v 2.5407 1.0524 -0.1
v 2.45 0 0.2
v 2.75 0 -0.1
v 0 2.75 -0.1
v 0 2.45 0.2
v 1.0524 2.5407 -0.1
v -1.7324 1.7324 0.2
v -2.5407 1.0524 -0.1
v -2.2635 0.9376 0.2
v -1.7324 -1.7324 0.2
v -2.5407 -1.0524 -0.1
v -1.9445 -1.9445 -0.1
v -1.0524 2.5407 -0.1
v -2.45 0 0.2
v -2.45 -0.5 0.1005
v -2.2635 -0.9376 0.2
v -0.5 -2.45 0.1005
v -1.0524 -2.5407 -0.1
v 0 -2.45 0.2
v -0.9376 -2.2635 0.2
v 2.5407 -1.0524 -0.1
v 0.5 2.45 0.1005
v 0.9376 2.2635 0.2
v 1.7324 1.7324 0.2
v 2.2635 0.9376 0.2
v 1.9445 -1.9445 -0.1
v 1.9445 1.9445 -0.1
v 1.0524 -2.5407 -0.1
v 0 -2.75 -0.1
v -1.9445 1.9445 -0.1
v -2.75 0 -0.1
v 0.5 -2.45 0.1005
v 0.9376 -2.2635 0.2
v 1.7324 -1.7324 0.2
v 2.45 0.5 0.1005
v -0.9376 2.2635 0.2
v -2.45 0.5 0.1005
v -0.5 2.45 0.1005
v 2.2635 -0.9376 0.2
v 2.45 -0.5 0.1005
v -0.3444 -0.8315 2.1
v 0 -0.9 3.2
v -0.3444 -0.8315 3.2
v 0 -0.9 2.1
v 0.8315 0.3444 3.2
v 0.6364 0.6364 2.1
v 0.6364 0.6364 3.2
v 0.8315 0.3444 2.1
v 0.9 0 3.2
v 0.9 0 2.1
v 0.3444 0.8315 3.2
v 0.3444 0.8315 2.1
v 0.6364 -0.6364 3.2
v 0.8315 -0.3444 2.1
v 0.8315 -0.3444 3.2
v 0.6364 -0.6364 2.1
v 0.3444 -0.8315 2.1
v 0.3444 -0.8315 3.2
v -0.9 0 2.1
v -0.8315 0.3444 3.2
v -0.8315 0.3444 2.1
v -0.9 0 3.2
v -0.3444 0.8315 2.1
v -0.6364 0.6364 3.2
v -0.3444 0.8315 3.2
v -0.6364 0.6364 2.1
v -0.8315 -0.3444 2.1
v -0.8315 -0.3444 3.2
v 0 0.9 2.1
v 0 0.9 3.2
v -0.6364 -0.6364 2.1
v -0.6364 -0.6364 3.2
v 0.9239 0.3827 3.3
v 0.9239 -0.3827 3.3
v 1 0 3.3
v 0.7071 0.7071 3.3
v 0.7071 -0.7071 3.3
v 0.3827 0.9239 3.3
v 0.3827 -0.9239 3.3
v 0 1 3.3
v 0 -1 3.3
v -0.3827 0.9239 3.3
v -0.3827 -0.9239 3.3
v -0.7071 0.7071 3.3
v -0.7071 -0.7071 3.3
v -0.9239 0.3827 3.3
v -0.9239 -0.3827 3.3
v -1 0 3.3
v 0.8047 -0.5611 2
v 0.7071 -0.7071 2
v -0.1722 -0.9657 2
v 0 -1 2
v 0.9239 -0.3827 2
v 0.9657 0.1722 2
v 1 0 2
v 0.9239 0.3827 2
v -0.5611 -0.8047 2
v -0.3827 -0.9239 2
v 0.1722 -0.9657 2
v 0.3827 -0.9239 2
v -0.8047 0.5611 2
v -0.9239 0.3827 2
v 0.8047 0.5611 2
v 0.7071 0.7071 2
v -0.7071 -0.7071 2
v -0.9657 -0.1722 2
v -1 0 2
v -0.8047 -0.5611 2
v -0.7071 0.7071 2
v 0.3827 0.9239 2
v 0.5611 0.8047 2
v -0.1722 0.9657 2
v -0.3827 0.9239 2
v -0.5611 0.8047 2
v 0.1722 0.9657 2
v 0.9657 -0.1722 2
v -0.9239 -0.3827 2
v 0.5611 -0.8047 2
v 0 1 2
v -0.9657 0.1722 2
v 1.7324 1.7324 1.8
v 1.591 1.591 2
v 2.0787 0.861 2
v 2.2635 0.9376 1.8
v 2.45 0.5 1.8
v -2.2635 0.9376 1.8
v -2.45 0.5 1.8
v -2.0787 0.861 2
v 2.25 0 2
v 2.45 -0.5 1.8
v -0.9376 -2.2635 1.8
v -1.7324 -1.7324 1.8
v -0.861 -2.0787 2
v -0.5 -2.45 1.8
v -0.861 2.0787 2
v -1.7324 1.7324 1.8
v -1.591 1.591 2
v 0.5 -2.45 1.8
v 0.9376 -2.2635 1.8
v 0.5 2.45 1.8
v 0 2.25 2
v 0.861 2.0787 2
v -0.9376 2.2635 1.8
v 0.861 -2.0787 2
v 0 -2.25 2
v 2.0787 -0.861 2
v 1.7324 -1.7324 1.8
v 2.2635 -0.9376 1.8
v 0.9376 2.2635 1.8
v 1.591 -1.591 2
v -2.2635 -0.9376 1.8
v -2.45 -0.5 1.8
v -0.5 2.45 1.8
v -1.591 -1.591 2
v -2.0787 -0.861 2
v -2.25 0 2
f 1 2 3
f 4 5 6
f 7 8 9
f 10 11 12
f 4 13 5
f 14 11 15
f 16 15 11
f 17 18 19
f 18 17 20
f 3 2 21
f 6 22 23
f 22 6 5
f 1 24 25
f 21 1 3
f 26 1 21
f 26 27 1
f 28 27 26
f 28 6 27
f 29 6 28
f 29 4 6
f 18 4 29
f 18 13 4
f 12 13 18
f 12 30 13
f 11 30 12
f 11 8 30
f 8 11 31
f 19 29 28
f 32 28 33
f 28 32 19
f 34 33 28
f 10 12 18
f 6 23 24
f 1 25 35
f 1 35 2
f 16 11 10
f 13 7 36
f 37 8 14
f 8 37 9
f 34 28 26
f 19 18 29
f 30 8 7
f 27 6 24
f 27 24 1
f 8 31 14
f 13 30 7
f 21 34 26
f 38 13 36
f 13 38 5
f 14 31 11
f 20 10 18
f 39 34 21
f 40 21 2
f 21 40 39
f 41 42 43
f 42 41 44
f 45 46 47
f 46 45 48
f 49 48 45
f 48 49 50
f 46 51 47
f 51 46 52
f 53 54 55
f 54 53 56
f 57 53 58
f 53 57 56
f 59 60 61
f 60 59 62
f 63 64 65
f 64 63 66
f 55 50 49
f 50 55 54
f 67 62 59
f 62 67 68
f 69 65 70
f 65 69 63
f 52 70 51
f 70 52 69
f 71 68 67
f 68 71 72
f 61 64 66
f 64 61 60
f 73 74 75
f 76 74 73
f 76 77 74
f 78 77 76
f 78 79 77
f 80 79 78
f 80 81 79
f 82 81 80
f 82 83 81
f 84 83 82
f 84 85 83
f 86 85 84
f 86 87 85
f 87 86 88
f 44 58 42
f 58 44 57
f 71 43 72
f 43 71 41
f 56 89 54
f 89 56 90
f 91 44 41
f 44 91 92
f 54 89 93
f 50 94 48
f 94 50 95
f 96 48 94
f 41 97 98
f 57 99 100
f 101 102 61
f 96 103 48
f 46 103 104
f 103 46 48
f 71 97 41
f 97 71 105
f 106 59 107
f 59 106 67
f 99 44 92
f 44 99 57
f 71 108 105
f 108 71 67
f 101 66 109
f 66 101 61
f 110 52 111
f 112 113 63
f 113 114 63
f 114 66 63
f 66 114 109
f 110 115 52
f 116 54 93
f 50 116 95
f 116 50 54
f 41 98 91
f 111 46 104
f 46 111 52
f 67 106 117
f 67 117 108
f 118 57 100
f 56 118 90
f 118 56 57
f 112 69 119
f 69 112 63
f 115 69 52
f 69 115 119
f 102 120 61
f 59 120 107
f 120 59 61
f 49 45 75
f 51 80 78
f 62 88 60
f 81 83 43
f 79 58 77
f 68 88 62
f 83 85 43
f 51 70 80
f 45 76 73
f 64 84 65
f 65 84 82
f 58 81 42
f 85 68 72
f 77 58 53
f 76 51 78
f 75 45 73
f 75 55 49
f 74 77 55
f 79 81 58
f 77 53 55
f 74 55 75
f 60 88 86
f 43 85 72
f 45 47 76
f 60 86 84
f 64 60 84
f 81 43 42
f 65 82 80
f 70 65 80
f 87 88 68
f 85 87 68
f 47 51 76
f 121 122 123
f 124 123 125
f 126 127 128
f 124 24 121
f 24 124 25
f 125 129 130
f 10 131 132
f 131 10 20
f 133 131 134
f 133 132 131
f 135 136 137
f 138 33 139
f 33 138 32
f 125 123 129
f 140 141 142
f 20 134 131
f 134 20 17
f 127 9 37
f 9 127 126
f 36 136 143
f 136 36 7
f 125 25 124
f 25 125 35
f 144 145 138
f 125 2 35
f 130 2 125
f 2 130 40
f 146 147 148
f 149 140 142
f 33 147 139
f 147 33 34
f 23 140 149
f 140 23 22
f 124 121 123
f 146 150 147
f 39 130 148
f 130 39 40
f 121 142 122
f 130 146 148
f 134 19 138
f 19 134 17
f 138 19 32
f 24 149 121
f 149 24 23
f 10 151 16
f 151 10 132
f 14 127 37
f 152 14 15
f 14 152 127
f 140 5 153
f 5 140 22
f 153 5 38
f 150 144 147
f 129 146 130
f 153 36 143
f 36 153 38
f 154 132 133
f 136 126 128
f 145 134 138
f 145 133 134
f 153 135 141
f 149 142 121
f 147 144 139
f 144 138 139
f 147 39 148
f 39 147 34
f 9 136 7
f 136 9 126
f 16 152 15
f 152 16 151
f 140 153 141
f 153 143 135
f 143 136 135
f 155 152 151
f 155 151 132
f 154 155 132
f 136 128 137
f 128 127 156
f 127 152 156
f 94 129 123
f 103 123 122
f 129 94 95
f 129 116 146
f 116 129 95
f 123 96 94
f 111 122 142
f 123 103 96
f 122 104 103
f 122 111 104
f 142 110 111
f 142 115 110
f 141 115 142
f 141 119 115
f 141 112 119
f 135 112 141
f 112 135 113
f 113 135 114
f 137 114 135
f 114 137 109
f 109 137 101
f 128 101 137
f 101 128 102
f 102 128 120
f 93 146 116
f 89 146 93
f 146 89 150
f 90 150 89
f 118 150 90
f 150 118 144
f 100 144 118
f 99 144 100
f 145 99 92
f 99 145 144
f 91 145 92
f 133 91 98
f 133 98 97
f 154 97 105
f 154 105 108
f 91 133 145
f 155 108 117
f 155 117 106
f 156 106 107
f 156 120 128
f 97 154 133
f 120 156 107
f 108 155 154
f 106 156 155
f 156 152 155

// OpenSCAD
// Lego Compatible Build Modules

test_module="test lcbm_socket_hole";

module lcbm_socket_hole(socket_d=4.9, socket_h=2.0, socket_bevel=0.2, socket_base_ext=0.1, socket_hole_d=1.8, socket_hole_h=3.3,socket_hole_bevel=0.1,flat_side_w=1.5) {
    $fn=16;
        render() {
            union() {
                translate([0,0,-socket_base_ext]) cylinder(r1=socket_base_ext+socket_d/2+socket_bevel,r2=socket_d/2,h=socket_base_ext+socket_bevel);
                if(flat_side_w>0.0) {
                    hull() translate([0,0,-socket_base_ext/2]) {
                        cube([flat_side_w,socket_d,socket_base_ext],center=true);
                        cube([socket_d,flat_side_w,socket_base_ext],center=true);
                    }
                }
            }
            hull() {
                cylinder(r=socket_d/2,h=socket_h-socket_bevel);
                if(flat_side_w>0.0) {
                    translate([0,0,socket_h/2-socket_bevel/2]) {
                        cube([flat_side_w,socket_d,socket_h-socket_bevel],center=true);
                        cube([socket_d,flat_side_w,socket_h-socket_bevel],center=true);
                    }
                }
                if(socket_bevel>0.0) {
                    translate([0,0,socket_h-socket_bevel]) cylinder(r1=socket_d/2,r2=socket_d/2-socket_bevel,h=socket_bevel);
                }
            }
            if(socket_hole_d>0.0) {
                cylinder(r=socket_hole_d/2,h=socket_hole_h);
                translate([0,0,socket_h]) cylinder(r1=socket_hole_d/2+2*socket_hole_bevel,r2=socket_hole_d/2,h=2*socket_hole_bevel,center=true);
                if(socket_hole_bevel>0.0) {
                    translate([0,0,socket_hole_h-socket_hole_bevel]) cylinder(r1=socket_hole_d/2,r2=socket_hole_d/2+socket_hole_bevel,h=socket_hole_bevel,center=false);
                }
            }
        }
}

if(test_module=="test lcbm_socket_hole") {
    echo("Testing lcbm_socket_hole...");
    lcbm_socket_hole(flat_side_w=1.0);
}
